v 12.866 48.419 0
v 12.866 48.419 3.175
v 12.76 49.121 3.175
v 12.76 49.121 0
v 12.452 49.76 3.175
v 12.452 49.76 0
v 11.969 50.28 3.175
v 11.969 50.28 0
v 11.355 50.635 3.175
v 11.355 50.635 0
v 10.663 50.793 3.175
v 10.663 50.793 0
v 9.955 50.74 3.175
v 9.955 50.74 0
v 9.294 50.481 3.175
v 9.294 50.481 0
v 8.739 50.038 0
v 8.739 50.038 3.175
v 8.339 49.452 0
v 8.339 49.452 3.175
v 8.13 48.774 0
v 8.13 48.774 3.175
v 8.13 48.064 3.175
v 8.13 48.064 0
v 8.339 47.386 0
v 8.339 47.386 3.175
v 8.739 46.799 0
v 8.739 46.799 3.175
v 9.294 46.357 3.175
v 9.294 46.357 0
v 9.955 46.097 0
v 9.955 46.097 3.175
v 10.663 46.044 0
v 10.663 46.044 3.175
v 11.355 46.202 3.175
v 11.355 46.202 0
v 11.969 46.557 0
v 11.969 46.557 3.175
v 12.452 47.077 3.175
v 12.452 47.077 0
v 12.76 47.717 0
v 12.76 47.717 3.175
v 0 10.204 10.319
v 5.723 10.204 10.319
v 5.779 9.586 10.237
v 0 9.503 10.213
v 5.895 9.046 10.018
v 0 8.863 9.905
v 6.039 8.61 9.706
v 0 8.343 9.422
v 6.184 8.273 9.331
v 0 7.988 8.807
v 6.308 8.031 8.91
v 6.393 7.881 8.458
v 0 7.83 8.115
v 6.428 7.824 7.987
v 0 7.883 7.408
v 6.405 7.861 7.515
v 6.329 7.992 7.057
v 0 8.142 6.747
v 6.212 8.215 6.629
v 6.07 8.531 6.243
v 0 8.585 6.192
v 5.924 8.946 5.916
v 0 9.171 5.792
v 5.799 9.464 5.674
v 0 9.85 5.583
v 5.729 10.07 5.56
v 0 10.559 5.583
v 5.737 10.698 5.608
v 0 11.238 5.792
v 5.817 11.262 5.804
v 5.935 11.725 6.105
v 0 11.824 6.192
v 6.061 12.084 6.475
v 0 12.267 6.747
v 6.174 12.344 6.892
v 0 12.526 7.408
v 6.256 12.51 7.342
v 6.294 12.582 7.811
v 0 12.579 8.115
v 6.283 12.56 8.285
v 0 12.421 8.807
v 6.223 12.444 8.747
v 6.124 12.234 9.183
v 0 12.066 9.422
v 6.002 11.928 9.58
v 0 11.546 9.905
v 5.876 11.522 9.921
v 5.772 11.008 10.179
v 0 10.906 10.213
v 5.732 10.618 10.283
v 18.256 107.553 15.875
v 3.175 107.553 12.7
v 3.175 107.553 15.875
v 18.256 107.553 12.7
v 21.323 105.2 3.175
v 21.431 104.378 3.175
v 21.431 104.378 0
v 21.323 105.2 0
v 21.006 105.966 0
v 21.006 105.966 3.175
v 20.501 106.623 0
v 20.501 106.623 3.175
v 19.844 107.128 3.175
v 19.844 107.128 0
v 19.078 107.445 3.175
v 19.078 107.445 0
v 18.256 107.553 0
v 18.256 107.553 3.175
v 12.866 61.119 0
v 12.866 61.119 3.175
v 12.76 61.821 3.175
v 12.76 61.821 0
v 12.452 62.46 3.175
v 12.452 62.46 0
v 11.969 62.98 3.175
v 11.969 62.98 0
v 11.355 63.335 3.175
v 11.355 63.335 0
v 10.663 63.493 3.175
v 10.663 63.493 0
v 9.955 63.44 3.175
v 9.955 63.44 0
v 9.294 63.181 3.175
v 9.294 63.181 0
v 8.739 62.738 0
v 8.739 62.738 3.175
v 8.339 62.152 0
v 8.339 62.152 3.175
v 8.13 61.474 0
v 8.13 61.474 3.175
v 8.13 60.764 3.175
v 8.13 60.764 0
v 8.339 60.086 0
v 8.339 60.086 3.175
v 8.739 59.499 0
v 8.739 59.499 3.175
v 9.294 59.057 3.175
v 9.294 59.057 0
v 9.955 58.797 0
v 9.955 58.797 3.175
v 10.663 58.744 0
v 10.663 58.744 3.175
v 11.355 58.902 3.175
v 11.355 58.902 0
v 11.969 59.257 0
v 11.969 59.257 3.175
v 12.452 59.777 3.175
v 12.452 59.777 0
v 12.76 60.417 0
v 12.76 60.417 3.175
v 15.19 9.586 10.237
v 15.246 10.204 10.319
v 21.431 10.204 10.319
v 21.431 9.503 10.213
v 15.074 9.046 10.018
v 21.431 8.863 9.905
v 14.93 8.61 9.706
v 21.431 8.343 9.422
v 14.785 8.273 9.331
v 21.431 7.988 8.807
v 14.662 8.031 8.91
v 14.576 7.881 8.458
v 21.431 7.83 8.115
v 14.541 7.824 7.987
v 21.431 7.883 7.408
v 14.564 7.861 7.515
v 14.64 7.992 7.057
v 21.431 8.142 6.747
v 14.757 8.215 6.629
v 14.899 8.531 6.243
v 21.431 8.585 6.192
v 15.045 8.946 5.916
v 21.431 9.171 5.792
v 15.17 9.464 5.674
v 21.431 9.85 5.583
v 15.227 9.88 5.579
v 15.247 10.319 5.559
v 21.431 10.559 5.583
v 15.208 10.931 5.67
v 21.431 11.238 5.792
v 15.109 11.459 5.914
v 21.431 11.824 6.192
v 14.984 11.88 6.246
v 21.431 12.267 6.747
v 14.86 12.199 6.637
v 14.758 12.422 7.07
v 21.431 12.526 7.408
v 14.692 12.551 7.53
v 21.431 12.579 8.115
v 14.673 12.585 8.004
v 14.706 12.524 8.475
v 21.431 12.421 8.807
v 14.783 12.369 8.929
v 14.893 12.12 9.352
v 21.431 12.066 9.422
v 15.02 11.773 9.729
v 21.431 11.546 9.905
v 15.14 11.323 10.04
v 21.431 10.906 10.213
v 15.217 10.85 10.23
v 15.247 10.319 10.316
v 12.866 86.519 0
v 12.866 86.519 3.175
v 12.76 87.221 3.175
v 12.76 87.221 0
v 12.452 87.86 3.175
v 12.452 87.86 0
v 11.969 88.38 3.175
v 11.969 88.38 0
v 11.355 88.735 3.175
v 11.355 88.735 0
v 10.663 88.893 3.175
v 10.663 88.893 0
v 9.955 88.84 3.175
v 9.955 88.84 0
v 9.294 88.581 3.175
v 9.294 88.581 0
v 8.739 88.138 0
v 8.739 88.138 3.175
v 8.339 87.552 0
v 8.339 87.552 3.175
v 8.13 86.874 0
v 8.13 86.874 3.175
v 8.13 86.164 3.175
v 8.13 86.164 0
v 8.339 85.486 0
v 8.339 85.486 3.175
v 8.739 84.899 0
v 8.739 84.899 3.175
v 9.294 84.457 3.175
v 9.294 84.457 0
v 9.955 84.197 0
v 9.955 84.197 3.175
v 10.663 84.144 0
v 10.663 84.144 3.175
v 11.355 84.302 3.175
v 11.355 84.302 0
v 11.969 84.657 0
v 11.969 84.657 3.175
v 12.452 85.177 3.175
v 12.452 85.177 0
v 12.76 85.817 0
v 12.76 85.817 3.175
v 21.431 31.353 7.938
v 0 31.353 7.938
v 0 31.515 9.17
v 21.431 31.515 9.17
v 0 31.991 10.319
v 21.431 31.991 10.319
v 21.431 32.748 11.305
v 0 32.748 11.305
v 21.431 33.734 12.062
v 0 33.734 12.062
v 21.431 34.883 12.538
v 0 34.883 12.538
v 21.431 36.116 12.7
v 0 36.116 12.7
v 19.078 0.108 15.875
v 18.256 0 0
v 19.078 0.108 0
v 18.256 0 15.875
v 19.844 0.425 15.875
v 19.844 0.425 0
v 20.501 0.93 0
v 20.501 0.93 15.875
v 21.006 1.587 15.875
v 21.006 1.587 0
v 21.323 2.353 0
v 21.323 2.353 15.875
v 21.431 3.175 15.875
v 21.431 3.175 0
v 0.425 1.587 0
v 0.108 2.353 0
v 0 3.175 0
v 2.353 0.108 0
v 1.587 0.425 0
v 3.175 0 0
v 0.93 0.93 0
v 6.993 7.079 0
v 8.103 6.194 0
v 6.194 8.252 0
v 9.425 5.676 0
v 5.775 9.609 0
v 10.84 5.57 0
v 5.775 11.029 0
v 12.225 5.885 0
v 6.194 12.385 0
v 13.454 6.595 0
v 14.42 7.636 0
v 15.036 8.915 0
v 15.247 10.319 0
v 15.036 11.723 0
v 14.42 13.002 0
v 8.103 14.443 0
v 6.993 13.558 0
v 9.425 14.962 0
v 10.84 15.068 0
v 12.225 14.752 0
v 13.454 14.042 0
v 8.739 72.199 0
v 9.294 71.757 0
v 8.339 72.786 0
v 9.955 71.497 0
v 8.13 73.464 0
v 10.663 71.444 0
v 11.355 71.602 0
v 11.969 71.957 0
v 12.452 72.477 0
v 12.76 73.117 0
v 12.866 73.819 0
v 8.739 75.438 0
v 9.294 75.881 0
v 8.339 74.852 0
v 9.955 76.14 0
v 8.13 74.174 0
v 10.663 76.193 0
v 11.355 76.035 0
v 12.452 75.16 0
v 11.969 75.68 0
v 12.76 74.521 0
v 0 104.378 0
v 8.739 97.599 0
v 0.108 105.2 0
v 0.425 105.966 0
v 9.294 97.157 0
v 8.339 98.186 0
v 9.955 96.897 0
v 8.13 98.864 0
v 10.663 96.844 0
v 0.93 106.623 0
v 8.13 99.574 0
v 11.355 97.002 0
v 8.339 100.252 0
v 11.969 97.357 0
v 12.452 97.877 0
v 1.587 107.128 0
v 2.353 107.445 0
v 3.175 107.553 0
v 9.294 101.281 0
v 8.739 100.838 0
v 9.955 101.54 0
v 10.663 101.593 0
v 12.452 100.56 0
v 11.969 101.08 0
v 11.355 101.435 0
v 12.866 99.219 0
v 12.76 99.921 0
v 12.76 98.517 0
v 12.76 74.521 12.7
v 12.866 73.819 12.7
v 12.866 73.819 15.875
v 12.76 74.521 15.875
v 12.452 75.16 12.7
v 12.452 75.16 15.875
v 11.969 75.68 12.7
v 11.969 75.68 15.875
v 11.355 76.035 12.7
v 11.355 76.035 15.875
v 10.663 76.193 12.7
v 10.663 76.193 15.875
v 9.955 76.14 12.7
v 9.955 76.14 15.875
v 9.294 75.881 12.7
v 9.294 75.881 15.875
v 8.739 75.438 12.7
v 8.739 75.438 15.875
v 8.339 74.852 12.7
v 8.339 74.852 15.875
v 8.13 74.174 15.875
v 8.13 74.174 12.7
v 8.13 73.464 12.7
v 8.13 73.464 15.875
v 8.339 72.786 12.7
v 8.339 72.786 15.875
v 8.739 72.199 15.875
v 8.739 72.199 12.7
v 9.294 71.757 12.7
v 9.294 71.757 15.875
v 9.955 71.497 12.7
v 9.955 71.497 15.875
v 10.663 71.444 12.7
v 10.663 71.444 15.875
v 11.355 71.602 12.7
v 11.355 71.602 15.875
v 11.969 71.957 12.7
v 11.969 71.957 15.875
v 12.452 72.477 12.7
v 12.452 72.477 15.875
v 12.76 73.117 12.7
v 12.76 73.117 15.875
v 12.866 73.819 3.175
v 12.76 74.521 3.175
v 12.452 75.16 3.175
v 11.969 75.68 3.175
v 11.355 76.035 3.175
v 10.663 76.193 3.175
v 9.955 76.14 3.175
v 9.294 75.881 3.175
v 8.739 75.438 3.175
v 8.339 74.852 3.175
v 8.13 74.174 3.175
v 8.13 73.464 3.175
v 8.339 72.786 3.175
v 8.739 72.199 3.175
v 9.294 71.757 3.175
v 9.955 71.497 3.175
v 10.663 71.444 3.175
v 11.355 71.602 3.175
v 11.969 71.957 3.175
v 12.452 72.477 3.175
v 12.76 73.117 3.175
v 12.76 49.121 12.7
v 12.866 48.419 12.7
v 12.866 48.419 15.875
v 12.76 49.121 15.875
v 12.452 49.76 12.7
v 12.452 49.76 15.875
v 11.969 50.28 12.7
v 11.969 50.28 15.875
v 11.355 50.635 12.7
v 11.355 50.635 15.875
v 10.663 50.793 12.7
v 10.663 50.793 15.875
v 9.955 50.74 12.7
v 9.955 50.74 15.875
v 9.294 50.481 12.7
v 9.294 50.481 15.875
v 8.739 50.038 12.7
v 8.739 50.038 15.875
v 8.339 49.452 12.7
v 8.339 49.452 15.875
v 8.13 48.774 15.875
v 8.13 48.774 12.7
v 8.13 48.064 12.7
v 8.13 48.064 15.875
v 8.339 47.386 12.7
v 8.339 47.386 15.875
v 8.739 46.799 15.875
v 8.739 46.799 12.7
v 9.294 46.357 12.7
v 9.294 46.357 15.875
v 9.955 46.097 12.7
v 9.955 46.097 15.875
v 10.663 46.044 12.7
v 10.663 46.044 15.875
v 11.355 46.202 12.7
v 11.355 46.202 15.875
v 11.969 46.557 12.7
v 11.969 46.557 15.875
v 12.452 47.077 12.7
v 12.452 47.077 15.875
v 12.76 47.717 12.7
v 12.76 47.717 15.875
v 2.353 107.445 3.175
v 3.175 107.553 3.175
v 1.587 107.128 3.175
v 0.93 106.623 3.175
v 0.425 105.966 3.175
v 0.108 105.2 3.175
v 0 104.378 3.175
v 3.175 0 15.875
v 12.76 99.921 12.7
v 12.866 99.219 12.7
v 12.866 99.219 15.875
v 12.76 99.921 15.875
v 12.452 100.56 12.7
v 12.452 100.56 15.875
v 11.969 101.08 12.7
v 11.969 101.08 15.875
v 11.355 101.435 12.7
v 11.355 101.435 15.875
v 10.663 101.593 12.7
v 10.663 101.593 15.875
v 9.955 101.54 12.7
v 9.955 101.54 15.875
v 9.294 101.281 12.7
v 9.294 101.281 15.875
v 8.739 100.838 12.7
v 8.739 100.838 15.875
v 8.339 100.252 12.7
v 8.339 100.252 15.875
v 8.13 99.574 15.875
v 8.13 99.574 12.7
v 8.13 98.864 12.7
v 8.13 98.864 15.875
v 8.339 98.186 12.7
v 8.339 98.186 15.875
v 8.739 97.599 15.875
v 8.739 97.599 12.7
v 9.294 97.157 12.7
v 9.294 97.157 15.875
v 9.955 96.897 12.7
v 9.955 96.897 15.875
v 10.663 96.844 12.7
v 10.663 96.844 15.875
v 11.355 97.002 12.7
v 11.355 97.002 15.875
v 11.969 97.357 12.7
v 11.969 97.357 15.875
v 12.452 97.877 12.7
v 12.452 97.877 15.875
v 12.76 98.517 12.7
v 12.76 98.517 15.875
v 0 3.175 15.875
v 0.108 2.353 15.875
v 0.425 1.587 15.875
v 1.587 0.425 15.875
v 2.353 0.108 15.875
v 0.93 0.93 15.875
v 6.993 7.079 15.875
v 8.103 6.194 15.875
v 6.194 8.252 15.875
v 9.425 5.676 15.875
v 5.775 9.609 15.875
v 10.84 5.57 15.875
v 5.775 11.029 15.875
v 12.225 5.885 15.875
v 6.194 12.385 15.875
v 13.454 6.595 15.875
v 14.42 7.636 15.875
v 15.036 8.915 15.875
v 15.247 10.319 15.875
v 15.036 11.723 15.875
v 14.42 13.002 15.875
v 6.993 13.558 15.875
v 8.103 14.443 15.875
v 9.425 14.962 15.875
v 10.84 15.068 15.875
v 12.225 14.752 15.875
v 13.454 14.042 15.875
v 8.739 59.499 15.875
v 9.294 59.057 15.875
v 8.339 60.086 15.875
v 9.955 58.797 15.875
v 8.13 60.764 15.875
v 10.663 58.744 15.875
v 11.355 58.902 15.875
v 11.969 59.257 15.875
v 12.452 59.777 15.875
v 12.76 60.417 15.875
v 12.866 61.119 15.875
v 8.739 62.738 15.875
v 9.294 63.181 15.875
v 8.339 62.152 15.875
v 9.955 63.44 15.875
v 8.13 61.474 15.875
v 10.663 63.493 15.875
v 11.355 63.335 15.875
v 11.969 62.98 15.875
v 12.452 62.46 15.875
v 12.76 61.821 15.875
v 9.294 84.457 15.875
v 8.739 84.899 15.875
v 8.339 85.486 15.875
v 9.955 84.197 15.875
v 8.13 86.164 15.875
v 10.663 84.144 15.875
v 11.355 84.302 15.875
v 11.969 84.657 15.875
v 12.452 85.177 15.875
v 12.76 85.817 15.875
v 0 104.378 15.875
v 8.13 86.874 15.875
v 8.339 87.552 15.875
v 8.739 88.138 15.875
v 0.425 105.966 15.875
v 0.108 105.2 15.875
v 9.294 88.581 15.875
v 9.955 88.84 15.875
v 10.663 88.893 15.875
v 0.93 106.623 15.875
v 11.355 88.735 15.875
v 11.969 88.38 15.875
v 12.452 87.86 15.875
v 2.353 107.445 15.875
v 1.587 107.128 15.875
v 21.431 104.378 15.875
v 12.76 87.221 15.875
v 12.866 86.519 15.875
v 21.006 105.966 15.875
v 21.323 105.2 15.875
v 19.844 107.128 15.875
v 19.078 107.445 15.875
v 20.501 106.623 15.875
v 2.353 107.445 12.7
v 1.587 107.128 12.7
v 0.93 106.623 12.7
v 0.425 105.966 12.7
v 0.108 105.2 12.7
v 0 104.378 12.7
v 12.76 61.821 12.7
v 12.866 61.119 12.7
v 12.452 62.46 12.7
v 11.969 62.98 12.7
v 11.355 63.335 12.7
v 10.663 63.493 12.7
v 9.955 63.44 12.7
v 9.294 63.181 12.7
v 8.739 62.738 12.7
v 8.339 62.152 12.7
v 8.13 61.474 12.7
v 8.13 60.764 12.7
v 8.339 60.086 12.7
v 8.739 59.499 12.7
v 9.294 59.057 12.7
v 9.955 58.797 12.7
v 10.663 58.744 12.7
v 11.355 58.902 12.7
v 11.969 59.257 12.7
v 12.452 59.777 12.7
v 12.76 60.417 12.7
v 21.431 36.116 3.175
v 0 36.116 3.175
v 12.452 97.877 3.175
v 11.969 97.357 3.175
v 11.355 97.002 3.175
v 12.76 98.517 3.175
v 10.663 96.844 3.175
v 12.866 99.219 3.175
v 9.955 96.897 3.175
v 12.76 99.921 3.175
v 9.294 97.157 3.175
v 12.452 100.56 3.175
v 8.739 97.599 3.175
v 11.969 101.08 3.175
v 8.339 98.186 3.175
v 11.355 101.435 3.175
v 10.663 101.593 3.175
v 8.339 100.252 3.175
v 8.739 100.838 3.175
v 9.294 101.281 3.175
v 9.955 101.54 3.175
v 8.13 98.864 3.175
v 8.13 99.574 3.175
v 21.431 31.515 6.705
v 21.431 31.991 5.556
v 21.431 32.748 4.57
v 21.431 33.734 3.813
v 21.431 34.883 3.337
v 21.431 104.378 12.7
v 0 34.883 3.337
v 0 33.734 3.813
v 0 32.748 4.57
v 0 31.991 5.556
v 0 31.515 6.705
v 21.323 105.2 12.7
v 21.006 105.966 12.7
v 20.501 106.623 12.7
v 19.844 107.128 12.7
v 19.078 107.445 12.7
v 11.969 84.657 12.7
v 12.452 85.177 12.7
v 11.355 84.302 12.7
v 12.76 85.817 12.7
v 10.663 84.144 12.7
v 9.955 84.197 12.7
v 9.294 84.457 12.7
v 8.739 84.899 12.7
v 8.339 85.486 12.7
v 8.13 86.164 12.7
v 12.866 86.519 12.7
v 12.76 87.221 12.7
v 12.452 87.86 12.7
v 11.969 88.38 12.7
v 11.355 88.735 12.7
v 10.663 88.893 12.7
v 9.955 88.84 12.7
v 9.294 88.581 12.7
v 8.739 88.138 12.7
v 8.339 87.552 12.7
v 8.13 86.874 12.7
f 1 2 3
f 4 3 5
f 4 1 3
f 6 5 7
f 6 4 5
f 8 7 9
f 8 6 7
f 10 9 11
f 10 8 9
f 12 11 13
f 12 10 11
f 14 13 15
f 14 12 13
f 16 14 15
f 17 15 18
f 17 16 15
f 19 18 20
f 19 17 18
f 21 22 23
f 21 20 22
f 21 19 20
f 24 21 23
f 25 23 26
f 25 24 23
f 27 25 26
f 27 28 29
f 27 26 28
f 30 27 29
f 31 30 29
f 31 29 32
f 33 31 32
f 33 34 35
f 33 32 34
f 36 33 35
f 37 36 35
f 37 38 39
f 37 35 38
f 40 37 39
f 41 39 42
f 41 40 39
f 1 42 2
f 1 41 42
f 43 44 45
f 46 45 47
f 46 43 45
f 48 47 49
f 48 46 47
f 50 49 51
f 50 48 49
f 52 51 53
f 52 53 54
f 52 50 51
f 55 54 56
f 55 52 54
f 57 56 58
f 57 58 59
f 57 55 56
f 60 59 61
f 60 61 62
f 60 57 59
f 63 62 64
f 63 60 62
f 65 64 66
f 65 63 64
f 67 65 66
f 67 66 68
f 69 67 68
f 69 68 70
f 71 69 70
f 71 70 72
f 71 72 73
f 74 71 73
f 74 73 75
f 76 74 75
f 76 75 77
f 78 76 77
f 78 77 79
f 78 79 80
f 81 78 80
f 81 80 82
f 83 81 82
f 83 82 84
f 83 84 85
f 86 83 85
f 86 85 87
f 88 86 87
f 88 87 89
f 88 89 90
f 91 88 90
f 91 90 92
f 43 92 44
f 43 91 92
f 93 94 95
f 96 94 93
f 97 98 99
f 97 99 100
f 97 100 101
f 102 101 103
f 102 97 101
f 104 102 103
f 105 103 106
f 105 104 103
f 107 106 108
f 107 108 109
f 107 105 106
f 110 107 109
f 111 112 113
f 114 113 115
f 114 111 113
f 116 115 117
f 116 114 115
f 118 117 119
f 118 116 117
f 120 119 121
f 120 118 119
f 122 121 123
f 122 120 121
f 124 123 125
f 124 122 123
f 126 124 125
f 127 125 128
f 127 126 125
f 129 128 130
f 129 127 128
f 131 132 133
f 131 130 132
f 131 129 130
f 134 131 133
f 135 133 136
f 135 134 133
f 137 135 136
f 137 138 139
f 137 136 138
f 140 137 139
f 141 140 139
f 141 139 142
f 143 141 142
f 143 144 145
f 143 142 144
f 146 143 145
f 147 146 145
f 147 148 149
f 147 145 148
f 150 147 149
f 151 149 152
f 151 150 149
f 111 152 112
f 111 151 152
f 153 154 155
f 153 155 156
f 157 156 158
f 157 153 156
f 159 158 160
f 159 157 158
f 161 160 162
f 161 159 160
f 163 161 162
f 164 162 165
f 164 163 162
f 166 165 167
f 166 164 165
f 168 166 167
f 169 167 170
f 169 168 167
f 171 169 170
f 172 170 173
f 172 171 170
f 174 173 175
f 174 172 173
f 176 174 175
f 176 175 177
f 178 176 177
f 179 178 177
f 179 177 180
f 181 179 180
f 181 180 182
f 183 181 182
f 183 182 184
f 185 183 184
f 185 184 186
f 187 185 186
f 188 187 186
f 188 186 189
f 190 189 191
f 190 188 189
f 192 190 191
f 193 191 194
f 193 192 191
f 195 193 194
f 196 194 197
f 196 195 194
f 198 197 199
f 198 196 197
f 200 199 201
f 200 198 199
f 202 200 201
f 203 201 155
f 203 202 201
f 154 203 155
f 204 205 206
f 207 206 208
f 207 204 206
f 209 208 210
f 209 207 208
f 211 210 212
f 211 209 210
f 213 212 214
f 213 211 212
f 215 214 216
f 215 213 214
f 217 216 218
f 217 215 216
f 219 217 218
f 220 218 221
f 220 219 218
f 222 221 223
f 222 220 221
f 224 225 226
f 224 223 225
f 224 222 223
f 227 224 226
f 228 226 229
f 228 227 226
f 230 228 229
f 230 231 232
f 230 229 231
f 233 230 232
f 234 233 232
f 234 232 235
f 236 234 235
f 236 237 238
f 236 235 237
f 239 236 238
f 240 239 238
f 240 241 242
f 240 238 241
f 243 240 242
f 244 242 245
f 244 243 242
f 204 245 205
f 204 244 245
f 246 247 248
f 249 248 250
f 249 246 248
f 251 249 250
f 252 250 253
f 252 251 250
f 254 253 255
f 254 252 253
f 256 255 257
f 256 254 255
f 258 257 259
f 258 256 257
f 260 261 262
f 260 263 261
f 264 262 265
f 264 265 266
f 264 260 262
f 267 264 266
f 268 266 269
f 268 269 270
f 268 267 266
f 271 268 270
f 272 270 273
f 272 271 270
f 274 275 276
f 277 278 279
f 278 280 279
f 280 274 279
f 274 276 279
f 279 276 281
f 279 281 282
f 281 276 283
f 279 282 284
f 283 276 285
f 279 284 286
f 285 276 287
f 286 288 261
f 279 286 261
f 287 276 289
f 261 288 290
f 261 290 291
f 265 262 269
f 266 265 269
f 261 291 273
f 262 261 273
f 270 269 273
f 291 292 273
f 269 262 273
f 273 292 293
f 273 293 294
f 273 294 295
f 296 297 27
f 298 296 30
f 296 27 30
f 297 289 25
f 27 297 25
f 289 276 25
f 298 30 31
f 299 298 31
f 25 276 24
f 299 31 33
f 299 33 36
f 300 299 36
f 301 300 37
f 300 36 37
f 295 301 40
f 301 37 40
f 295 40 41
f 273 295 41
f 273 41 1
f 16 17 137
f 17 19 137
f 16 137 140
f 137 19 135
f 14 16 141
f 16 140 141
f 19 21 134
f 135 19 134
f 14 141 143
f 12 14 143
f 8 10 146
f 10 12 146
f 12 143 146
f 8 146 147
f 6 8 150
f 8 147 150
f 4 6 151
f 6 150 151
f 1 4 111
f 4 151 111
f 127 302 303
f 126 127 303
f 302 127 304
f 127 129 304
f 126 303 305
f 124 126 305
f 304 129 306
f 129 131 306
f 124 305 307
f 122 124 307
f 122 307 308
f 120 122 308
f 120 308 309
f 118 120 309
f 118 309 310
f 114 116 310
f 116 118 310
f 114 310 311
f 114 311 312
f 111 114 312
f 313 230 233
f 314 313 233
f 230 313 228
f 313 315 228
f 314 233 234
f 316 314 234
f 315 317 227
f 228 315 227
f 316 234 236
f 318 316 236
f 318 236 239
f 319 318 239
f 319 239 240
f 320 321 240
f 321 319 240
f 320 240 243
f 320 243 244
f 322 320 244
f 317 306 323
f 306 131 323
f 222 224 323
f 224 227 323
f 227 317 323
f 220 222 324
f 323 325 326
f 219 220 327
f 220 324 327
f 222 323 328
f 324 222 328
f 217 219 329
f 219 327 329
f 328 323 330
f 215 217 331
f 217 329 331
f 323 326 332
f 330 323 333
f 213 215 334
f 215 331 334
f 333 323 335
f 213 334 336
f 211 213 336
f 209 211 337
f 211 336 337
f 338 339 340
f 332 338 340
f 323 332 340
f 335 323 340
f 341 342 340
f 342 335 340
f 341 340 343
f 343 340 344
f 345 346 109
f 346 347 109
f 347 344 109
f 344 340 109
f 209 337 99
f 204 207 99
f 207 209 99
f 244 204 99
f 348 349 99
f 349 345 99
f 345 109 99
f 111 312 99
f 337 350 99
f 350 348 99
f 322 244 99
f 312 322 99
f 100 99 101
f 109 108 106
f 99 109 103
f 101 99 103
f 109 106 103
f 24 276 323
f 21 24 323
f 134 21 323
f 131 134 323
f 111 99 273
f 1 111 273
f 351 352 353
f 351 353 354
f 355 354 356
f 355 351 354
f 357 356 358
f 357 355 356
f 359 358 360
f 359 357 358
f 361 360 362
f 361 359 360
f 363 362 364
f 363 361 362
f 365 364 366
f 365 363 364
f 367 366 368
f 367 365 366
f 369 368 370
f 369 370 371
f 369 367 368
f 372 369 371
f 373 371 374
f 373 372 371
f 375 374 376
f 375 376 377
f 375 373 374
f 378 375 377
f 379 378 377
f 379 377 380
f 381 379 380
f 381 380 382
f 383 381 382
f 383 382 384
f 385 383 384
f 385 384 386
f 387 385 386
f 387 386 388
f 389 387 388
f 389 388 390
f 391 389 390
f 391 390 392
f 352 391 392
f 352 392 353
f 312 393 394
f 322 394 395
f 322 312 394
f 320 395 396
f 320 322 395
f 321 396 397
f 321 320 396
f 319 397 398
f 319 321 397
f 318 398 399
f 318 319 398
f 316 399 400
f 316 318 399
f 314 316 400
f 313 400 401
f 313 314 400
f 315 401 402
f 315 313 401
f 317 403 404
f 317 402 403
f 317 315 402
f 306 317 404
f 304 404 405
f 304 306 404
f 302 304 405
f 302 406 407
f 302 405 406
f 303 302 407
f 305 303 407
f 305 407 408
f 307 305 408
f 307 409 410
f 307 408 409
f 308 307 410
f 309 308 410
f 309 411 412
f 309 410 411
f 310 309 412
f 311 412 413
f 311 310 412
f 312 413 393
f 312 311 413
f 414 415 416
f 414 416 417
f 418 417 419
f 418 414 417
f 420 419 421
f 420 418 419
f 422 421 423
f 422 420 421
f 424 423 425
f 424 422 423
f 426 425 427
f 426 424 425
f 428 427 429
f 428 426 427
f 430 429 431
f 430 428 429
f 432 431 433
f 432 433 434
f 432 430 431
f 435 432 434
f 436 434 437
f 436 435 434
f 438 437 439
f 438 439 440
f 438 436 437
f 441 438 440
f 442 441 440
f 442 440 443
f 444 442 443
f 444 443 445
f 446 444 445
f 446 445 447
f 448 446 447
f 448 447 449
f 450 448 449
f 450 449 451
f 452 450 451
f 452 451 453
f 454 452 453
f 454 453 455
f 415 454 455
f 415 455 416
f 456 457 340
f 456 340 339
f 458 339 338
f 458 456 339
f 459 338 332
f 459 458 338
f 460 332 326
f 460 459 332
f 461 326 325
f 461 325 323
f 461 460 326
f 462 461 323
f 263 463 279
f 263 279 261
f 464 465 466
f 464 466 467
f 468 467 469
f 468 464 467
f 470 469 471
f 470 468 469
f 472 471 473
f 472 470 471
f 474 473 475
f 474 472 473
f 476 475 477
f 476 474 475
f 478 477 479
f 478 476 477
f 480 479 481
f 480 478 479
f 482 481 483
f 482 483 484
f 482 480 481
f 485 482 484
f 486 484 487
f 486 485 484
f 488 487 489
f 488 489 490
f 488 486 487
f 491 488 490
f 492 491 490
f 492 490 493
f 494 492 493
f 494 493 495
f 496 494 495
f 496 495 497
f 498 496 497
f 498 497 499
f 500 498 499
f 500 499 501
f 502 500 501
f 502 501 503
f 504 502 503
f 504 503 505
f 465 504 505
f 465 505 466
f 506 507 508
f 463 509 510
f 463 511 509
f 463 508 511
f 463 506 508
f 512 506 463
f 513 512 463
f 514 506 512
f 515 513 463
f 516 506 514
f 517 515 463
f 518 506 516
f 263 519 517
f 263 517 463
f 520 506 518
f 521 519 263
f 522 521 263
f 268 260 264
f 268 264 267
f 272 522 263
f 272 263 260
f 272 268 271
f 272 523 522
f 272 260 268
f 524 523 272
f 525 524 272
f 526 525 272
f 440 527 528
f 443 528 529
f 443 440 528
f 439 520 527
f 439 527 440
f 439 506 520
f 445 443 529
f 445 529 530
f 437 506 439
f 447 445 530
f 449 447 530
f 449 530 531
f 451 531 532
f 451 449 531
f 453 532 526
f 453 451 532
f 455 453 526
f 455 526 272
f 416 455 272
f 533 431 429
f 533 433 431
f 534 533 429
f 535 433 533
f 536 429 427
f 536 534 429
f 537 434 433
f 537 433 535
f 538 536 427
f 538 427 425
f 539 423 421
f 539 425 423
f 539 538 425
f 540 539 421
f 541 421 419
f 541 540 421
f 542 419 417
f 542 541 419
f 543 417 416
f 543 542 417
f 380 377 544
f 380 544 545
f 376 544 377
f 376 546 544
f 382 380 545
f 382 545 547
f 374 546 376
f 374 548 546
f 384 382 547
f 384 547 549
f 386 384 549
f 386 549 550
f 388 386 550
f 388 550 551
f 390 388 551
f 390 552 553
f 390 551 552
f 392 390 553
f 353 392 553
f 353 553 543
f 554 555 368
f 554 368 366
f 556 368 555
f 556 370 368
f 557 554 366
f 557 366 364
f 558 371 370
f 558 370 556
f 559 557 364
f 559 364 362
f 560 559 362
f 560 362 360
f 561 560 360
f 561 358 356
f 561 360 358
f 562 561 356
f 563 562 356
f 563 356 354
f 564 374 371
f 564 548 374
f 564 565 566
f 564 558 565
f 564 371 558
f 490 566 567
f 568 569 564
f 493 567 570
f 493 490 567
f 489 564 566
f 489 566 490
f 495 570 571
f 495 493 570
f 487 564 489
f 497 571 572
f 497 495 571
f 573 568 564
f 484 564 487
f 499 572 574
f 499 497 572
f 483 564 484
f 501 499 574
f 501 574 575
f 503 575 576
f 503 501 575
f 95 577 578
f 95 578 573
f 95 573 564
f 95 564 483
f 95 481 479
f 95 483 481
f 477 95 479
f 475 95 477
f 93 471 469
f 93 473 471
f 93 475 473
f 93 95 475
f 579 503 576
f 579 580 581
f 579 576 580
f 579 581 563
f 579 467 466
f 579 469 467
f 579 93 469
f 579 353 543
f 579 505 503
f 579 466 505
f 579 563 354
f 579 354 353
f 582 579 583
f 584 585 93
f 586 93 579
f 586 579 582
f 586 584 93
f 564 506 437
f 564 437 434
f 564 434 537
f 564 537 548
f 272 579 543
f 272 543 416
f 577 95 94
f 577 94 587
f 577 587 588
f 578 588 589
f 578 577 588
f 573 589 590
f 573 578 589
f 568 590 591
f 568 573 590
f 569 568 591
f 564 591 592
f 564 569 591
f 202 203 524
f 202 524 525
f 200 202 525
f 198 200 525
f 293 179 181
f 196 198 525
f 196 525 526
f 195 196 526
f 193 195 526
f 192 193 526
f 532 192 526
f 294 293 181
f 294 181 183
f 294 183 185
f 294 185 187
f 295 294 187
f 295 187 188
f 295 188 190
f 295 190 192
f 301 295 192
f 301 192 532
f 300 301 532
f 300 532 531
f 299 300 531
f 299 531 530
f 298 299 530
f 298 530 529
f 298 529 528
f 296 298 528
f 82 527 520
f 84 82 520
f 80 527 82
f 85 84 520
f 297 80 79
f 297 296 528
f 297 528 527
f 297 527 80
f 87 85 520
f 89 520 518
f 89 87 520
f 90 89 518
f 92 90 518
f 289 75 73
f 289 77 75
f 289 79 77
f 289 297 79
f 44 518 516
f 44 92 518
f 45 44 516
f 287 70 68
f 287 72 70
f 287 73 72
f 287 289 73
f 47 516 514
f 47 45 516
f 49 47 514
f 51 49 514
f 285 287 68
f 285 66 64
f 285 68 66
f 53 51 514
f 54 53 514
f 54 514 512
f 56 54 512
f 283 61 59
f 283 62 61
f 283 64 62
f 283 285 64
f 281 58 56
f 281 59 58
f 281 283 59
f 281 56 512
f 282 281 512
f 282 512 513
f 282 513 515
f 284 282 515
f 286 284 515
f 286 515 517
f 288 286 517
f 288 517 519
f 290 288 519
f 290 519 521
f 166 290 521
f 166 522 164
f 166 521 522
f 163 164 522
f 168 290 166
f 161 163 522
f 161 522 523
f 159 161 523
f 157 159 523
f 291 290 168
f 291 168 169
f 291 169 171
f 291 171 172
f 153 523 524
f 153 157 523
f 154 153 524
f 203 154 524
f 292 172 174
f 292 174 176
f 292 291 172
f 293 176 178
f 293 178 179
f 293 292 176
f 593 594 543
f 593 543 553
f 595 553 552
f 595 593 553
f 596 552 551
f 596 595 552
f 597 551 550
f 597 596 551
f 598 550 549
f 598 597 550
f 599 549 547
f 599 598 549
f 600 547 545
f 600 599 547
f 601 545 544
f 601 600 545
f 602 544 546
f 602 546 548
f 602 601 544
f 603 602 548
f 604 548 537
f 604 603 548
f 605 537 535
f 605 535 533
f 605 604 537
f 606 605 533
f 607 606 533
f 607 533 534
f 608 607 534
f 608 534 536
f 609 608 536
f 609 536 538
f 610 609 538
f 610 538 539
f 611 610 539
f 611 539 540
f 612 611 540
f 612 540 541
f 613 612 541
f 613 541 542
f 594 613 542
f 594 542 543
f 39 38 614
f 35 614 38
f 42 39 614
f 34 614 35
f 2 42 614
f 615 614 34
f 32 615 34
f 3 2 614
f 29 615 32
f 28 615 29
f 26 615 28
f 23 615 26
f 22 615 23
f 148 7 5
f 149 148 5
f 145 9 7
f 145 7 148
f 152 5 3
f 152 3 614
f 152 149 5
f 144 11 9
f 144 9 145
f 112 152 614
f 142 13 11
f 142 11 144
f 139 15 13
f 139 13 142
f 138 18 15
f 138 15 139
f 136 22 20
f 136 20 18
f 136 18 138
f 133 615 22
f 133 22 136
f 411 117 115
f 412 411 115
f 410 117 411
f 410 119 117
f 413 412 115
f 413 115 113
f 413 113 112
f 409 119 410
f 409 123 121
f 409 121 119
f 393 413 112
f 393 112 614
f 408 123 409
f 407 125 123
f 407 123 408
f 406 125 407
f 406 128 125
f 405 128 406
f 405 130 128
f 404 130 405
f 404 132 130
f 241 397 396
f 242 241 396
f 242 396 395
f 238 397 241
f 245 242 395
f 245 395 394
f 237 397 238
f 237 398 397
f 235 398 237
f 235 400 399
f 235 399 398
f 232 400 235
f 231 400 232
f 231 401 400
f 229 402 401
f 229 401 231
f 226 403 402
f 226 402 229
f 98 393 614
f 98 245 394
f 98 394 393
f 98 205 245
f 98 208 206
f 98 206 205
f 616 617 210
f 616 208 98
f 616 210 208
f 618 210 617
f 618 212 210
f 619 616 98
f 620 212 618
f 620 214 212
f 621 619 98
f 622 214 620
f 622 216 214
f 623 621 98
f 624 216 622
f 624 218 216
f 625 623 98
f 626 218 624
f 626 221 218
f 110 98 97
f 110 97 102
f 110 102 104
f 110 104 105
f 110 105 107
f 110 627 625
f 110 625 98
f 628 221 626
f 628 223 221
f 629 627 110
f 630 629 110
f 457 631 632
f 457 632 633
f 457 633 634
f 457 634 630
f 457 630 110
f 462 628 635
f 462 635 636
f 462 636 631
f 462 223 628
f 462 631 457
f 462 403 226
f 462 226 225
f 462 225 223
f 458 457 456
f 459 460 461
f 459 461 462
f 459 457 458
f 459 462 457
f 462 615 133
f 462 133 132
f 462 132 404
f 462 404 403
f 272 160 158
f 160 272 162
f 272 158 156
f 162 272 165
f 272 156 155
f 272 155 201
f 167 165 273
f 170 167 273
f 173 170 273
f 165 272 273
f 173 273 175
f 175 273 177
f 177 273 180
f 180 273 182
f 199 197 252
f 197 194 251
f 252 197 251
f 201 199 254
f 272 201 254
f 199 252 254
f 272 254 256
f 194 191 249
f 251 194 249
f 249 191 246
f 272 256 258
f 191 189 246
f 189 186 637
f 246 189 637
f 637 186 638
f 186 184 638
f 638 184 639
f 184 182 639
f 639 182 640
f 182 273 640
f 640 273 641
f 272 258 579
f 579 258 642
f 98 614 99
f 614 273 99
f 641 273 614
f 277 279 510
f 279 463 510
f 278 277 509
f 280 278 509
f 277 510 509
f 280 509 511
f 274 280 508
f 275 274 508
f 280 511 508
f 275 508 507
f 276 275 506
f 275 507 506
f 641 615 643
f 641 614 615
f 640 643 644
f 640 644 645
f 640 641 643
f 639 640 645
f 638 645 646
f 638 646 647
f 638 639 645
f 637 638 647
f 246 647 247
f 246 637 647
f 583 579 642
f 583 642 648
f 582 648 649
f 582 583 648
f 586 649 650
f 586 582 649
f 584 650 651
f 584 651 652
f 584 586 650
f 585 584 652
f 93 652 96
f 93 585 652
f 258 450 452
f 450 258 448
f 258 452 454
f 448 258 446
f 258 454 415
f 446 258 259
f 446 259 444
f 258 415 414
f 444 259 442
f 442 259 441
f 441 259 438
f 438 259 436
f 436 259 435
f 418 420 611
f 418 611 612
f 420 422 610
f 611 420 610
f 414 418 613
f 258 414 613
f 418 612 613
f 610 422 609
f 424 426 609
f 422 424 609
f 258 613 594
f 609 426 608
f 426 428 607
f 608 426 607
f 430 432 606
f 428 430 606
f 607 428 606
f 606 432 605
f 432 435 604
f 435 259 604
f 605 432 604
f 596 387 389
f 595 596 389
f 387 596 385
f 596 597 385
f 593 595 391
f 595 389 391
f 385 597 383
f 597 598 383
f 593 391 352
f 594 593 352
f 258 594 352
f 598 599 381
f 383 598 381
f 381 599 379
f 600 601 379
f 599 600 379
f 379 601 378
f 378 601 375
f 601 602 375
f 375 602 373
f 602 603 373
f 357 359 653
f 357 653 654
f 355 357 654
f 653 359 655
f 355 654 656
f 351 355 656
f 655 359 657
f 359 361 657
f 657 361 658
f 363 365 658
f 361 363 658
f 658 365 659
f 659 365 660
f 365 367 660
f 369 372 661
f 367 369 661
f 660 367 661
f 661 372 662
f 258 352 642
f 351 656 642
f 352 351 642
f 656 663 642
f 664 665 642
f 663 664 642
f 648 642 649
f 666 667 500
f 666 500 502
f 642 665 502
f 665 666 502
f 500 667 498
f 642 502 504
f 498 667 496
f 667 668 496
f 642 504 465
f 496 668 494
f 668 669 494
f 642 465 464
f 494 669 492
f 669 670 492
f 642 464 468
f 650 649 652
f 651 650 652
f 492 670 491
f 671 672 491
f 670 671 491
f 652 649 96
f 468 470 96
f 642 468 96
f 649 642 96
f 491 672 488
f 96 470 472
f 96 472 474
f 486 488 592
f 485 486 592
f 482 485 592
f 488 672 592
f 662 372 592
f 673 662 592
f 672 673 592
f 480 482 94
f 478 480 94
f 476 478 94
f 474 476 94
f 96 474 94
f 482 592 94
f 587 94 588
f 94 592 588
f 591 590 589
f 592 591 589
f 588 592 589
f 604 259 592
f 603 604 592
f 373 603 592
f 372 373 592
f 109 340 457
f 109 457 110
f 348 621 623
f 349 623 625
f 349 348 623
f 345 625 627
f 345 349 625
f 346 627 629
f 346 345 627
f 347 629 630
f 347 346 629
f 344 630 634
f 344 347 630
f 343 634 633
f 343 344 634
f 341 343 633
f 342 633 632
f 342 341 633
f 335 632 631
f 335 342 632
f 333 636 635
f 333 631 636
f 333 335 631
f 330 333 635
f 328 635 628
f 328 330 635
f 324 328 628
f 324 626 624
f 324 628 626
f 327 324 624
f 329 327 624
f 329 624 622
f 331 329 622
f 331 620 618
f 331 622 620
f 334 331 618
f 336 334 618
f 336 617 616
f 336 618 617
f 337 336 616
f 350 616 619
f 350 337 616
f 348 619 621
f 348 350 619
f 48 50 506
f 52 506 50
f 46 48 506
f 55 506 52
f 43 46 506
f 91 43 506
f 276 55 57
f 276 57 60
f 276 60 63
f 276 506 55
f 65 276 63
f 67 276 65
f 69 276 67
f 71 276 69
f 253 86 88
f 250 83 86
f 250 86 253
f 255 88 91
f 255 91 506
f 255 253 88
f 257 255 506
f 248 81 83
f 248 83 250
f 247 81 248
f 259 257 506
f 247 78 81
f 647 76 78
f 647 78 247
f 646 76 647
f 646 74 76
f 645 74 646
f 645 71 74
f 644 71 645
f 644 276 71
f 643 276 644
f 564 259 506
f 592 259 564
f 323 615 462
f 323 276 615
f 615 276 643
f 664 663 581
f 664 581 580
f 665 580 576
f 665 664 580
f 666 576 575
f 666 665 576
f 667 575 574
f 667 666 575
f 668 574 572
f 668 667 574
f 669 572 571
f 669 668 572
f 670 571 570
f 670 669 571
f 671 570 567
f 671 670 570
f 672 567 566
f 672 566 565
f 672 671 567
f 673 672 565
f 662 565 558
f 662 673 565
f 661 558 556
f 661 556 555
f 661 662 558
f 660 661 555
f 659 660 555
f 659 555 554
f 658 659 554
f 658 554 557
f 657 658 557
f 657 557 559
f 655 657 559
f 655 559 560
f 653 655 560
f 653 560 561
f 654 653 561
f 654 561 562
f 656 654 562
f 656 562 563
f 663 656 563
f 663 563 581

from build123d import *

# Parameters (mm, degrees)
SKETCH1_W           = 21.43125
SKETCH1_H           = 107.553125
SKETCH1_R           = 4.7625
SKETCH1_R_2         = 2.38125
BOSS_EXTRUDE3_DEPTH = 15.875
FILLET1_R           = 3.175
FILLET2_R           = 3.175
FILLET3_R           = 3.175
FILLET4_R           = 3.175
SKETCH3_W           = 9.525
SKETCH3_H           = 76.2
CUT_EXTRUDE2_DEPTH  = 111.810598766
FILLET5_R           = 4.7625
FILLET6_R           = 4.7625
SKETCH5_R           = 2.38125
CUT_EXTRUDE3_DEPTH  = 21.43125


with BuildPart() as part:
    # Sketch1 → Boss-Extrude3 (new body)
    with BuildSketch(Plane.XY):
        with Locations((10.715625, 53.7765625)):
            Rectangle(SKETCH1_W, SKETCH1_H)
        with Locations((10.484595663, 10.31875)):
            Circle(SKETCH1_R, mode=Mode.SUBTRACT)
        with Locations((10.484595663, 99.21875)):
            Circle(SKETCH1_R_2, mode=Mode.SUBTRACT)
        with Locations((10.484595663, 86.51875)):
            Circle(SKETCH1_R_2, mode=Mode.SUBTRACT)
        with Locations((10.484595663, 73.81875)):
            Circle(SKETCH1_R_2, mode=Mode.SUBTRACT)
        with Locations((10.484595663, 61.11875)):
            Circle(SKETCH1_R_2, mode=Mode.SUBTRACT)
        with Locations((10.484595663, 48.41875)):
            Circle(SKETCH1_R_2, mode=Mode.SUBTRACT)
    extrude(amount=BOSS_EXTRUDE3_DEPTH)

    # Fillet1
    fillet1_edges = [part.edges().sort_by_distance(p)[0] for p in [
        (21.43125, 0, 7.9375),
    ]]
    fillet(fillet1_edges, radius=FILLET1_R)

    # Fillet2
    fillet2_edges = [part.edges().sort_by_distance(p)[0] for p in [
        (0, 0, 7.9375),
    ]]
    fillet(fillet2_edges, radius=FILLET2_R)

    # Fillet3
    fillet3_edges = [part.edges().sort_by_distance(p)[0] for p in [
        (21.43125, 107.553125, 7.9375),
    ]]
    fillet(fillet3_edges, radius=FILLET3_R)

    # Fillet4
    fillet4_edges = [part.edges().sort_by_distance(p)[0] for p in [
        (0, 107.553125, 7.9375),
    ]]
    fillet(fillet4_edges, radius=FILLET4_R)

    # Sketch3 → Cut-Extrude2 (cut, through all)
    with BuildSketch(Plane(origin=(0, 0, 0), x_dir=(0, 0, -1), z_dir=(1, 0, 0))):
        with Locations((-7.9375, 69.453125)):
            Rectangle(SKETCH3_W, SKETCH3_H)
    extrude(amount=CUT_EXTRUDE2_DEPTH, mode=Mode.SUBTRACT)

    # Fillet5
    fillet5_edges = [part.edges().sort_by_distance(p)[0] for p in [
        (10.715625, 31.353125, 3.175),
    ]]
    fillet(fillet5_edges, radius=FILLET5_R)

    # Fillet6
    fillet6_edges = [part.edges().sort_by_distance(p)[0] for p in [
        (10.715625, 31.353125, 12.7),
    ]]
    fillet(fillet6_edges, radius=FILLET6_R - 0.0001)  # a hair under: the kernel refuses the full size

    # Sketch5 → Cut-Extrude3 (cut)
    with BuildSketch(Plane(origin=(0, 0, 0), x_dir=(0, 0, -1), z_dir=(1, 0, 0))):
        with Locations(Location((-7.9375, 10.20445, 0), (0, 0, 180))):
            Circle(SKETCH5_R)
    extrude(amount=CUT_EXTRUDE3_DEPTH, mode=Mode.SUBTRACT)


solid = part.part
